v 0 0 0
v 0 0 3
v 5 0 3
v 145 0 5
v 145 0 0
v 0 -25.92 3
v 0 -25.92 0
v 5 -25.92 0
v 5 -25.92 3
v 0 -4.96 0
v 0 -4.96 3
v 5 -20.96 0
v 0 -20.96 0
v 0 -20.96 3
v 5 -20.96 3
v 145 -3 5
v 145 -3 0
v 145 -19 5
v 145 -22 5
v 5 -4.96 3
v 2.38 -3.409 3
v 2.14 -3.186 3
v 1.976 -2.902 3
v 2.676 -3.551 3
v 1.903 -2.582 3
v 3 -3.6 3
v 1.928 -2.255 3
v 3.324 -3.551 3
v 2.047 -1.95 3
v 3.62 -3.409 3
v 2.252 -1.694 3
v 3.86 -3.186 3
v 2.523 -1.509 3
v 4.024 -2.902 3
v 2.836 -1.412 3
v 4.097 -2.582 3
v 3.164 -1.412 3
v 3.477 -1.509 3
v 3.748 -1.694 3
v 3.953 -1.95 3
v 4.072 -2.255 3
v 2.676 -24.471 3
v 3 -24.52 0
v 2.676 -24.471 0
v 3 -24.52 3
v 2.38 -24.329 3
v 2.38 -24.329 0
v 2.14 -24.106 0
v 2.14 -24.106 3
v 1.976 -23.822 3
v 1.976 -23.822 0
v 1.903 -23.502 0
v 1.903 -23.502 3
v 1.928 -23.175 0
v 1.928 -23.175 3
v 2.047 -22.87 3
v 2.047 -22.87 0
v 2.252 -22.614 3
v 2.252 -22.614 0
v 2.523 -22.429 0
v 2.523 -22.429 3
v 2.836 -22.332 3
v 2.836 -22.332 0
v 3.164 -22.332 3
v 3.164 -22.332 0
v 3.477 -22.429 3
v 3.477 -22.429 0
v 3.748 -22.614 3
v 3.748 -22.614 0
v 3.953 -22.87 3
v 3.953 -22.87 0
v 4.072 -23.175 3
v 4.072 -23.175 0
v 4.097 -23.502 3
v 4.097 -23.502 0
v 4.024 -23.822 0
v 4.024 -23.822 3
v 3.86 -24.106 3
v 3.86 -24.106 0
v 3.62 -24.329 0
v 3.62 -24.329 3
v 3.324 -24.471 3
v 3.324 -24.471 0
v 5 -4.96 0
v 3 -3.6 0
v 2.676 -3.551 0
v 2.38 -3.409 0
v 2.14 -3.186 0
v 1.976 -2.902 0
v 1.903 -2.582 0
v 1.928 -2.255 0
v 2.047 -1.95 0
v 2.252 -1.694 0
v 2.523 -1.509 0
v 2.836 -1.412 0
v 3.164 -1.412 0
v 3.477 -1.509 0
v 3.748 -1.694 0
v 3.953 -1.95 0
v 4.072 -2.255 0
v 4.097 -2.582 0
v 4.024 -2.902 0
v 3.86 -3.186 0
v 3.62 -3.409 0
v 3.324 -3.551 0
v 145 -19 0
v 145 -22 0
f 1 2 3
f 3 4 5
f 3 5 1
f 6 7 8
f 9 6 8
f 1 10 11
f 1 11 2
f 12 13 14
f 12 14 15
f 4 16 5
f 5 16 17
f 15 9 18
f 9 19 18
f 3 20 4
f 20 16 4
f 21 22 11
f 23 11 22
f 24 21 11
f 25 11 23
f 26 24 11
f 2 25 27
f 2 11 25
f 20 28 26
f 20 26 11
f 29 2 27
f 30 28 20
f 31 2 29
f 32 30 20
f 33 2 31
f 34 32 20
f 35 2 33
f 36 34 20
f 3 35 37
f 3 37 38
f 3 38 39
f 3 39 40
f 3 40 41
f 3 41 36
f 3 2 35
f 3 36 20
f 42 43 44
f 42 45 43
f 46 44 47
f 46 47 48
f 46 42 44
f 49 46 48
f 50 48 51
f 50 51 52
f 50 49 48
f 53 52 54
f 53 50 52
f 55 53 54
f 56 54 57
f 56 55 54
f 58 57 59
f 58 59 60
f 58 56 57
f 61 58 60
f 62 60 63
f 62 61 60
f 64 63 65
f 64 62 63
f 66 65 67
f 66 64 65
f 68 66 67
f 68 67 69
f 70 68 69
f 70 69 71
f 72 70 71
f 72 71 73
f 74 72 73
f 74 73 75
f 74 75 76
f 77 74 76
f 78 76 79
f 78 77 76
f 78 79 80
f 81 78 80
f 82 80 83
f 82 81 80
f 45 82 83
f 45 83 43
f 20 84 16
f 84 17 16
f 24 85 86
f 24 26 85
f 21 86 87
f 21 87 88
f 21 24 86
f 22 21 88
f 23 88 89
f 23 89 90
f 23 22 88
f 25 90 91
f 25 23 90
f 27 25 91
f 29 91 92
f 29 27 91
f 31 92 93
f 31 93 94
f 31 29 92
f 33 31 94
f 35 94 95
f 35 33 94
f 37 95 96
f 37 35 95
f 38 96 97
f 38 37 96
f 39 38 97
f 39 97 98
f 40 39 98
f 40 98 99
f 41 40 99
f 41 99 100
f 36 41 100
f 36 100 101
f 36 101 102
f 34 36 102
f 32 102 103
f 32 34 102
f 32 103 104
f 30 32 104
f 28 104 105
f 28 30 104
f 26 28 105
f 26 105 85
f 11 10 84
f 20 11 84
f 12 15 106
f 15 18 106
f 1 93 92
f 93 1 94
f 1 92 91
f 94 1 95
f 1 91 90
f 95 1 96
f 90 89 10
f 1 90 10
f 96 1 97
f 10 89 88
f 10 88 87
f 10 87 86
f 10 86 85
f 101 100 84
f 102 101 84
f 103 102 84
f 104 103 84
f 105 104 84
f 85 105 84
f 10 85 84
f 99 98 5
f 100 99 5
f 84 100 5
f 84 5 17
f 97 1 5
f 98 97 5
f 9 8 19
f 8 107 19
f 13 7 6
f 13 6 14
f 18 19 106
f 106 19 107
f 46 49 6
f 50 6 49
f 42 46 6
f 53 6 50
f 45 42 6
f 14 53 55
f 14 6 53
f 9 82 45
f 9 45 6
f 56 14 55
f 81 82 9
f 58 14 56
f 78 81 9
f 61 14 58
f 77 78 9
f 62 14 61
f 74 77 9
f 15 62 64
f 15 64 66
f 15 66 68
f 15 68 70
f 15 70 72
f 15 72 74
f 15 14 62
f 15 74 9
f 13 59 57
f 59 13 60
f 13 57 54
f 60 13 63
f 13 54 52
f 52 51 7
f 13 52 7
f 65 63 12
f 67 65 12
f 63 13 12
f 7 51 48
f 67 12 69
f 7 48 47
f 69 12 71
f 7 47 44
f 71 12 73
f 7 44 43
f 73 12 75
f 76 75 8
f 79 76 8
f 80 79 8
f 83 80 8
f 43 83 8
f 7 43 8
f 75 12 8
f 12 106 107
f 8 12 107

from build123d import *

# Parameters (mm, degrees)
SKIZZE1_W                         = 5
SKIZZE1_H                         = 4.96
AUFSATZ_LINEAR_AUSTRAGEN1_DEPTH   = 3
AUFSATZ_LINEAR_AUSTRAGEN1_2_DEPTH = 3
DURCHGANGSLOCH_F_R_M21_AT_2_COUNT = 2
DURCHGANGSLOCH_F_R_M21_AT_2_PITCH = 20.92
SKIZZE6_W                         = 5
SKIZZE6_H                         = 3
SKIZZE7_W                         = 5
SKIZZE7_H                         = 3


with BuildPart() as part:
    # Skizze1 → Aufsatz-Linear austragen1 (new body)
    with BuildSketch(Plane.XY):
        with Locations((2.5, -2.48)):
            Rectangle(SKIZZE1_W, SKIZZE1_H)
    extrude(amount=AUFSATZ_LINEAR_AUSTRAGEN1_DEPTH)

    # Skizze2 → Durchgangsloch für M21 (revolve, cut)
    with BuildSketch(Plane(origin=(3, -2.5, 3), x_dir=(0, -1, 0), z_dir=(1, 0, 0))):
        Polygon((0, 0), (0, 3.660946681), (1.1, 3), (1.1, 0), align=None)
    durchgangsloch_f_r_m21 = revolve(axis=Axis((3, -2.5, 9.35), (0, 0, -1)), mode=Mode.SUBTRACT)

    # Skizze7 → section 1 of ausformung3
    with BuildSketch(Plane(origin=(145, 0, 0), x_dir=(0, 0, -1), z_dir=(1, 0, 0)), mode=Mode.PRIVATE) as ausformung3_s1:
        with Locations((-2.5, -1.5)):
            Rectangle(SKIZZE7_W, SKIZZE7_H)
    # loft from a face of the part (ausformung3)
    loft([part.faces().sort_by_distance((5, -2.48, 1.5))[0], ausformung3_s1.sketch])


with BuildPart() as body_2:
    # Skizze1 → Aufsatz-Linear austragen1 2 (new body)
    with BuildSketch(Plane.XY):
        with Locations((2.5, -23.44)):
            Rectangle(SKIZZE1_W, SKIZZE1_H)
    extrude(amount=AUFSATZ_LINEAR_AUSTRAGEN1_2_DEPTH)

    # Durchgangsloch für M21 at 2: Durchgangsloch für M21 ×2
    with Locations(*[(0, -i * DURCHGANGSLOCH_F_R_M21_AT_2_PITCH, 0) for i in range(1, DURCHGANGSLOCH_F_R_M21_AT_2_COUNT)]):
        add(durchgangsloch_f_r_m21, mode=Mode.SUBTRACT)

    # Skizze6 → section 1 of ausformung1
    with BuildSketch(Plane(origin=(145, 0, 0), x_dir=(0, 0, -1), z_dir=(1, 0, 0)), mode=Mode.PRIVATE) as ausformung1_s1:
        with Locations((-2.5, -20.5)):
            Rectangle(SKIZZE6_W, SKIZZE6_H)
    # loft from a face of the part (ausformung1)
    loft([body_2.faces().sort_by_distance((5, -23.44, 1.5))[0], ausformung1_s1.sketch])


solid = Compound([part.part, body_2.part])
